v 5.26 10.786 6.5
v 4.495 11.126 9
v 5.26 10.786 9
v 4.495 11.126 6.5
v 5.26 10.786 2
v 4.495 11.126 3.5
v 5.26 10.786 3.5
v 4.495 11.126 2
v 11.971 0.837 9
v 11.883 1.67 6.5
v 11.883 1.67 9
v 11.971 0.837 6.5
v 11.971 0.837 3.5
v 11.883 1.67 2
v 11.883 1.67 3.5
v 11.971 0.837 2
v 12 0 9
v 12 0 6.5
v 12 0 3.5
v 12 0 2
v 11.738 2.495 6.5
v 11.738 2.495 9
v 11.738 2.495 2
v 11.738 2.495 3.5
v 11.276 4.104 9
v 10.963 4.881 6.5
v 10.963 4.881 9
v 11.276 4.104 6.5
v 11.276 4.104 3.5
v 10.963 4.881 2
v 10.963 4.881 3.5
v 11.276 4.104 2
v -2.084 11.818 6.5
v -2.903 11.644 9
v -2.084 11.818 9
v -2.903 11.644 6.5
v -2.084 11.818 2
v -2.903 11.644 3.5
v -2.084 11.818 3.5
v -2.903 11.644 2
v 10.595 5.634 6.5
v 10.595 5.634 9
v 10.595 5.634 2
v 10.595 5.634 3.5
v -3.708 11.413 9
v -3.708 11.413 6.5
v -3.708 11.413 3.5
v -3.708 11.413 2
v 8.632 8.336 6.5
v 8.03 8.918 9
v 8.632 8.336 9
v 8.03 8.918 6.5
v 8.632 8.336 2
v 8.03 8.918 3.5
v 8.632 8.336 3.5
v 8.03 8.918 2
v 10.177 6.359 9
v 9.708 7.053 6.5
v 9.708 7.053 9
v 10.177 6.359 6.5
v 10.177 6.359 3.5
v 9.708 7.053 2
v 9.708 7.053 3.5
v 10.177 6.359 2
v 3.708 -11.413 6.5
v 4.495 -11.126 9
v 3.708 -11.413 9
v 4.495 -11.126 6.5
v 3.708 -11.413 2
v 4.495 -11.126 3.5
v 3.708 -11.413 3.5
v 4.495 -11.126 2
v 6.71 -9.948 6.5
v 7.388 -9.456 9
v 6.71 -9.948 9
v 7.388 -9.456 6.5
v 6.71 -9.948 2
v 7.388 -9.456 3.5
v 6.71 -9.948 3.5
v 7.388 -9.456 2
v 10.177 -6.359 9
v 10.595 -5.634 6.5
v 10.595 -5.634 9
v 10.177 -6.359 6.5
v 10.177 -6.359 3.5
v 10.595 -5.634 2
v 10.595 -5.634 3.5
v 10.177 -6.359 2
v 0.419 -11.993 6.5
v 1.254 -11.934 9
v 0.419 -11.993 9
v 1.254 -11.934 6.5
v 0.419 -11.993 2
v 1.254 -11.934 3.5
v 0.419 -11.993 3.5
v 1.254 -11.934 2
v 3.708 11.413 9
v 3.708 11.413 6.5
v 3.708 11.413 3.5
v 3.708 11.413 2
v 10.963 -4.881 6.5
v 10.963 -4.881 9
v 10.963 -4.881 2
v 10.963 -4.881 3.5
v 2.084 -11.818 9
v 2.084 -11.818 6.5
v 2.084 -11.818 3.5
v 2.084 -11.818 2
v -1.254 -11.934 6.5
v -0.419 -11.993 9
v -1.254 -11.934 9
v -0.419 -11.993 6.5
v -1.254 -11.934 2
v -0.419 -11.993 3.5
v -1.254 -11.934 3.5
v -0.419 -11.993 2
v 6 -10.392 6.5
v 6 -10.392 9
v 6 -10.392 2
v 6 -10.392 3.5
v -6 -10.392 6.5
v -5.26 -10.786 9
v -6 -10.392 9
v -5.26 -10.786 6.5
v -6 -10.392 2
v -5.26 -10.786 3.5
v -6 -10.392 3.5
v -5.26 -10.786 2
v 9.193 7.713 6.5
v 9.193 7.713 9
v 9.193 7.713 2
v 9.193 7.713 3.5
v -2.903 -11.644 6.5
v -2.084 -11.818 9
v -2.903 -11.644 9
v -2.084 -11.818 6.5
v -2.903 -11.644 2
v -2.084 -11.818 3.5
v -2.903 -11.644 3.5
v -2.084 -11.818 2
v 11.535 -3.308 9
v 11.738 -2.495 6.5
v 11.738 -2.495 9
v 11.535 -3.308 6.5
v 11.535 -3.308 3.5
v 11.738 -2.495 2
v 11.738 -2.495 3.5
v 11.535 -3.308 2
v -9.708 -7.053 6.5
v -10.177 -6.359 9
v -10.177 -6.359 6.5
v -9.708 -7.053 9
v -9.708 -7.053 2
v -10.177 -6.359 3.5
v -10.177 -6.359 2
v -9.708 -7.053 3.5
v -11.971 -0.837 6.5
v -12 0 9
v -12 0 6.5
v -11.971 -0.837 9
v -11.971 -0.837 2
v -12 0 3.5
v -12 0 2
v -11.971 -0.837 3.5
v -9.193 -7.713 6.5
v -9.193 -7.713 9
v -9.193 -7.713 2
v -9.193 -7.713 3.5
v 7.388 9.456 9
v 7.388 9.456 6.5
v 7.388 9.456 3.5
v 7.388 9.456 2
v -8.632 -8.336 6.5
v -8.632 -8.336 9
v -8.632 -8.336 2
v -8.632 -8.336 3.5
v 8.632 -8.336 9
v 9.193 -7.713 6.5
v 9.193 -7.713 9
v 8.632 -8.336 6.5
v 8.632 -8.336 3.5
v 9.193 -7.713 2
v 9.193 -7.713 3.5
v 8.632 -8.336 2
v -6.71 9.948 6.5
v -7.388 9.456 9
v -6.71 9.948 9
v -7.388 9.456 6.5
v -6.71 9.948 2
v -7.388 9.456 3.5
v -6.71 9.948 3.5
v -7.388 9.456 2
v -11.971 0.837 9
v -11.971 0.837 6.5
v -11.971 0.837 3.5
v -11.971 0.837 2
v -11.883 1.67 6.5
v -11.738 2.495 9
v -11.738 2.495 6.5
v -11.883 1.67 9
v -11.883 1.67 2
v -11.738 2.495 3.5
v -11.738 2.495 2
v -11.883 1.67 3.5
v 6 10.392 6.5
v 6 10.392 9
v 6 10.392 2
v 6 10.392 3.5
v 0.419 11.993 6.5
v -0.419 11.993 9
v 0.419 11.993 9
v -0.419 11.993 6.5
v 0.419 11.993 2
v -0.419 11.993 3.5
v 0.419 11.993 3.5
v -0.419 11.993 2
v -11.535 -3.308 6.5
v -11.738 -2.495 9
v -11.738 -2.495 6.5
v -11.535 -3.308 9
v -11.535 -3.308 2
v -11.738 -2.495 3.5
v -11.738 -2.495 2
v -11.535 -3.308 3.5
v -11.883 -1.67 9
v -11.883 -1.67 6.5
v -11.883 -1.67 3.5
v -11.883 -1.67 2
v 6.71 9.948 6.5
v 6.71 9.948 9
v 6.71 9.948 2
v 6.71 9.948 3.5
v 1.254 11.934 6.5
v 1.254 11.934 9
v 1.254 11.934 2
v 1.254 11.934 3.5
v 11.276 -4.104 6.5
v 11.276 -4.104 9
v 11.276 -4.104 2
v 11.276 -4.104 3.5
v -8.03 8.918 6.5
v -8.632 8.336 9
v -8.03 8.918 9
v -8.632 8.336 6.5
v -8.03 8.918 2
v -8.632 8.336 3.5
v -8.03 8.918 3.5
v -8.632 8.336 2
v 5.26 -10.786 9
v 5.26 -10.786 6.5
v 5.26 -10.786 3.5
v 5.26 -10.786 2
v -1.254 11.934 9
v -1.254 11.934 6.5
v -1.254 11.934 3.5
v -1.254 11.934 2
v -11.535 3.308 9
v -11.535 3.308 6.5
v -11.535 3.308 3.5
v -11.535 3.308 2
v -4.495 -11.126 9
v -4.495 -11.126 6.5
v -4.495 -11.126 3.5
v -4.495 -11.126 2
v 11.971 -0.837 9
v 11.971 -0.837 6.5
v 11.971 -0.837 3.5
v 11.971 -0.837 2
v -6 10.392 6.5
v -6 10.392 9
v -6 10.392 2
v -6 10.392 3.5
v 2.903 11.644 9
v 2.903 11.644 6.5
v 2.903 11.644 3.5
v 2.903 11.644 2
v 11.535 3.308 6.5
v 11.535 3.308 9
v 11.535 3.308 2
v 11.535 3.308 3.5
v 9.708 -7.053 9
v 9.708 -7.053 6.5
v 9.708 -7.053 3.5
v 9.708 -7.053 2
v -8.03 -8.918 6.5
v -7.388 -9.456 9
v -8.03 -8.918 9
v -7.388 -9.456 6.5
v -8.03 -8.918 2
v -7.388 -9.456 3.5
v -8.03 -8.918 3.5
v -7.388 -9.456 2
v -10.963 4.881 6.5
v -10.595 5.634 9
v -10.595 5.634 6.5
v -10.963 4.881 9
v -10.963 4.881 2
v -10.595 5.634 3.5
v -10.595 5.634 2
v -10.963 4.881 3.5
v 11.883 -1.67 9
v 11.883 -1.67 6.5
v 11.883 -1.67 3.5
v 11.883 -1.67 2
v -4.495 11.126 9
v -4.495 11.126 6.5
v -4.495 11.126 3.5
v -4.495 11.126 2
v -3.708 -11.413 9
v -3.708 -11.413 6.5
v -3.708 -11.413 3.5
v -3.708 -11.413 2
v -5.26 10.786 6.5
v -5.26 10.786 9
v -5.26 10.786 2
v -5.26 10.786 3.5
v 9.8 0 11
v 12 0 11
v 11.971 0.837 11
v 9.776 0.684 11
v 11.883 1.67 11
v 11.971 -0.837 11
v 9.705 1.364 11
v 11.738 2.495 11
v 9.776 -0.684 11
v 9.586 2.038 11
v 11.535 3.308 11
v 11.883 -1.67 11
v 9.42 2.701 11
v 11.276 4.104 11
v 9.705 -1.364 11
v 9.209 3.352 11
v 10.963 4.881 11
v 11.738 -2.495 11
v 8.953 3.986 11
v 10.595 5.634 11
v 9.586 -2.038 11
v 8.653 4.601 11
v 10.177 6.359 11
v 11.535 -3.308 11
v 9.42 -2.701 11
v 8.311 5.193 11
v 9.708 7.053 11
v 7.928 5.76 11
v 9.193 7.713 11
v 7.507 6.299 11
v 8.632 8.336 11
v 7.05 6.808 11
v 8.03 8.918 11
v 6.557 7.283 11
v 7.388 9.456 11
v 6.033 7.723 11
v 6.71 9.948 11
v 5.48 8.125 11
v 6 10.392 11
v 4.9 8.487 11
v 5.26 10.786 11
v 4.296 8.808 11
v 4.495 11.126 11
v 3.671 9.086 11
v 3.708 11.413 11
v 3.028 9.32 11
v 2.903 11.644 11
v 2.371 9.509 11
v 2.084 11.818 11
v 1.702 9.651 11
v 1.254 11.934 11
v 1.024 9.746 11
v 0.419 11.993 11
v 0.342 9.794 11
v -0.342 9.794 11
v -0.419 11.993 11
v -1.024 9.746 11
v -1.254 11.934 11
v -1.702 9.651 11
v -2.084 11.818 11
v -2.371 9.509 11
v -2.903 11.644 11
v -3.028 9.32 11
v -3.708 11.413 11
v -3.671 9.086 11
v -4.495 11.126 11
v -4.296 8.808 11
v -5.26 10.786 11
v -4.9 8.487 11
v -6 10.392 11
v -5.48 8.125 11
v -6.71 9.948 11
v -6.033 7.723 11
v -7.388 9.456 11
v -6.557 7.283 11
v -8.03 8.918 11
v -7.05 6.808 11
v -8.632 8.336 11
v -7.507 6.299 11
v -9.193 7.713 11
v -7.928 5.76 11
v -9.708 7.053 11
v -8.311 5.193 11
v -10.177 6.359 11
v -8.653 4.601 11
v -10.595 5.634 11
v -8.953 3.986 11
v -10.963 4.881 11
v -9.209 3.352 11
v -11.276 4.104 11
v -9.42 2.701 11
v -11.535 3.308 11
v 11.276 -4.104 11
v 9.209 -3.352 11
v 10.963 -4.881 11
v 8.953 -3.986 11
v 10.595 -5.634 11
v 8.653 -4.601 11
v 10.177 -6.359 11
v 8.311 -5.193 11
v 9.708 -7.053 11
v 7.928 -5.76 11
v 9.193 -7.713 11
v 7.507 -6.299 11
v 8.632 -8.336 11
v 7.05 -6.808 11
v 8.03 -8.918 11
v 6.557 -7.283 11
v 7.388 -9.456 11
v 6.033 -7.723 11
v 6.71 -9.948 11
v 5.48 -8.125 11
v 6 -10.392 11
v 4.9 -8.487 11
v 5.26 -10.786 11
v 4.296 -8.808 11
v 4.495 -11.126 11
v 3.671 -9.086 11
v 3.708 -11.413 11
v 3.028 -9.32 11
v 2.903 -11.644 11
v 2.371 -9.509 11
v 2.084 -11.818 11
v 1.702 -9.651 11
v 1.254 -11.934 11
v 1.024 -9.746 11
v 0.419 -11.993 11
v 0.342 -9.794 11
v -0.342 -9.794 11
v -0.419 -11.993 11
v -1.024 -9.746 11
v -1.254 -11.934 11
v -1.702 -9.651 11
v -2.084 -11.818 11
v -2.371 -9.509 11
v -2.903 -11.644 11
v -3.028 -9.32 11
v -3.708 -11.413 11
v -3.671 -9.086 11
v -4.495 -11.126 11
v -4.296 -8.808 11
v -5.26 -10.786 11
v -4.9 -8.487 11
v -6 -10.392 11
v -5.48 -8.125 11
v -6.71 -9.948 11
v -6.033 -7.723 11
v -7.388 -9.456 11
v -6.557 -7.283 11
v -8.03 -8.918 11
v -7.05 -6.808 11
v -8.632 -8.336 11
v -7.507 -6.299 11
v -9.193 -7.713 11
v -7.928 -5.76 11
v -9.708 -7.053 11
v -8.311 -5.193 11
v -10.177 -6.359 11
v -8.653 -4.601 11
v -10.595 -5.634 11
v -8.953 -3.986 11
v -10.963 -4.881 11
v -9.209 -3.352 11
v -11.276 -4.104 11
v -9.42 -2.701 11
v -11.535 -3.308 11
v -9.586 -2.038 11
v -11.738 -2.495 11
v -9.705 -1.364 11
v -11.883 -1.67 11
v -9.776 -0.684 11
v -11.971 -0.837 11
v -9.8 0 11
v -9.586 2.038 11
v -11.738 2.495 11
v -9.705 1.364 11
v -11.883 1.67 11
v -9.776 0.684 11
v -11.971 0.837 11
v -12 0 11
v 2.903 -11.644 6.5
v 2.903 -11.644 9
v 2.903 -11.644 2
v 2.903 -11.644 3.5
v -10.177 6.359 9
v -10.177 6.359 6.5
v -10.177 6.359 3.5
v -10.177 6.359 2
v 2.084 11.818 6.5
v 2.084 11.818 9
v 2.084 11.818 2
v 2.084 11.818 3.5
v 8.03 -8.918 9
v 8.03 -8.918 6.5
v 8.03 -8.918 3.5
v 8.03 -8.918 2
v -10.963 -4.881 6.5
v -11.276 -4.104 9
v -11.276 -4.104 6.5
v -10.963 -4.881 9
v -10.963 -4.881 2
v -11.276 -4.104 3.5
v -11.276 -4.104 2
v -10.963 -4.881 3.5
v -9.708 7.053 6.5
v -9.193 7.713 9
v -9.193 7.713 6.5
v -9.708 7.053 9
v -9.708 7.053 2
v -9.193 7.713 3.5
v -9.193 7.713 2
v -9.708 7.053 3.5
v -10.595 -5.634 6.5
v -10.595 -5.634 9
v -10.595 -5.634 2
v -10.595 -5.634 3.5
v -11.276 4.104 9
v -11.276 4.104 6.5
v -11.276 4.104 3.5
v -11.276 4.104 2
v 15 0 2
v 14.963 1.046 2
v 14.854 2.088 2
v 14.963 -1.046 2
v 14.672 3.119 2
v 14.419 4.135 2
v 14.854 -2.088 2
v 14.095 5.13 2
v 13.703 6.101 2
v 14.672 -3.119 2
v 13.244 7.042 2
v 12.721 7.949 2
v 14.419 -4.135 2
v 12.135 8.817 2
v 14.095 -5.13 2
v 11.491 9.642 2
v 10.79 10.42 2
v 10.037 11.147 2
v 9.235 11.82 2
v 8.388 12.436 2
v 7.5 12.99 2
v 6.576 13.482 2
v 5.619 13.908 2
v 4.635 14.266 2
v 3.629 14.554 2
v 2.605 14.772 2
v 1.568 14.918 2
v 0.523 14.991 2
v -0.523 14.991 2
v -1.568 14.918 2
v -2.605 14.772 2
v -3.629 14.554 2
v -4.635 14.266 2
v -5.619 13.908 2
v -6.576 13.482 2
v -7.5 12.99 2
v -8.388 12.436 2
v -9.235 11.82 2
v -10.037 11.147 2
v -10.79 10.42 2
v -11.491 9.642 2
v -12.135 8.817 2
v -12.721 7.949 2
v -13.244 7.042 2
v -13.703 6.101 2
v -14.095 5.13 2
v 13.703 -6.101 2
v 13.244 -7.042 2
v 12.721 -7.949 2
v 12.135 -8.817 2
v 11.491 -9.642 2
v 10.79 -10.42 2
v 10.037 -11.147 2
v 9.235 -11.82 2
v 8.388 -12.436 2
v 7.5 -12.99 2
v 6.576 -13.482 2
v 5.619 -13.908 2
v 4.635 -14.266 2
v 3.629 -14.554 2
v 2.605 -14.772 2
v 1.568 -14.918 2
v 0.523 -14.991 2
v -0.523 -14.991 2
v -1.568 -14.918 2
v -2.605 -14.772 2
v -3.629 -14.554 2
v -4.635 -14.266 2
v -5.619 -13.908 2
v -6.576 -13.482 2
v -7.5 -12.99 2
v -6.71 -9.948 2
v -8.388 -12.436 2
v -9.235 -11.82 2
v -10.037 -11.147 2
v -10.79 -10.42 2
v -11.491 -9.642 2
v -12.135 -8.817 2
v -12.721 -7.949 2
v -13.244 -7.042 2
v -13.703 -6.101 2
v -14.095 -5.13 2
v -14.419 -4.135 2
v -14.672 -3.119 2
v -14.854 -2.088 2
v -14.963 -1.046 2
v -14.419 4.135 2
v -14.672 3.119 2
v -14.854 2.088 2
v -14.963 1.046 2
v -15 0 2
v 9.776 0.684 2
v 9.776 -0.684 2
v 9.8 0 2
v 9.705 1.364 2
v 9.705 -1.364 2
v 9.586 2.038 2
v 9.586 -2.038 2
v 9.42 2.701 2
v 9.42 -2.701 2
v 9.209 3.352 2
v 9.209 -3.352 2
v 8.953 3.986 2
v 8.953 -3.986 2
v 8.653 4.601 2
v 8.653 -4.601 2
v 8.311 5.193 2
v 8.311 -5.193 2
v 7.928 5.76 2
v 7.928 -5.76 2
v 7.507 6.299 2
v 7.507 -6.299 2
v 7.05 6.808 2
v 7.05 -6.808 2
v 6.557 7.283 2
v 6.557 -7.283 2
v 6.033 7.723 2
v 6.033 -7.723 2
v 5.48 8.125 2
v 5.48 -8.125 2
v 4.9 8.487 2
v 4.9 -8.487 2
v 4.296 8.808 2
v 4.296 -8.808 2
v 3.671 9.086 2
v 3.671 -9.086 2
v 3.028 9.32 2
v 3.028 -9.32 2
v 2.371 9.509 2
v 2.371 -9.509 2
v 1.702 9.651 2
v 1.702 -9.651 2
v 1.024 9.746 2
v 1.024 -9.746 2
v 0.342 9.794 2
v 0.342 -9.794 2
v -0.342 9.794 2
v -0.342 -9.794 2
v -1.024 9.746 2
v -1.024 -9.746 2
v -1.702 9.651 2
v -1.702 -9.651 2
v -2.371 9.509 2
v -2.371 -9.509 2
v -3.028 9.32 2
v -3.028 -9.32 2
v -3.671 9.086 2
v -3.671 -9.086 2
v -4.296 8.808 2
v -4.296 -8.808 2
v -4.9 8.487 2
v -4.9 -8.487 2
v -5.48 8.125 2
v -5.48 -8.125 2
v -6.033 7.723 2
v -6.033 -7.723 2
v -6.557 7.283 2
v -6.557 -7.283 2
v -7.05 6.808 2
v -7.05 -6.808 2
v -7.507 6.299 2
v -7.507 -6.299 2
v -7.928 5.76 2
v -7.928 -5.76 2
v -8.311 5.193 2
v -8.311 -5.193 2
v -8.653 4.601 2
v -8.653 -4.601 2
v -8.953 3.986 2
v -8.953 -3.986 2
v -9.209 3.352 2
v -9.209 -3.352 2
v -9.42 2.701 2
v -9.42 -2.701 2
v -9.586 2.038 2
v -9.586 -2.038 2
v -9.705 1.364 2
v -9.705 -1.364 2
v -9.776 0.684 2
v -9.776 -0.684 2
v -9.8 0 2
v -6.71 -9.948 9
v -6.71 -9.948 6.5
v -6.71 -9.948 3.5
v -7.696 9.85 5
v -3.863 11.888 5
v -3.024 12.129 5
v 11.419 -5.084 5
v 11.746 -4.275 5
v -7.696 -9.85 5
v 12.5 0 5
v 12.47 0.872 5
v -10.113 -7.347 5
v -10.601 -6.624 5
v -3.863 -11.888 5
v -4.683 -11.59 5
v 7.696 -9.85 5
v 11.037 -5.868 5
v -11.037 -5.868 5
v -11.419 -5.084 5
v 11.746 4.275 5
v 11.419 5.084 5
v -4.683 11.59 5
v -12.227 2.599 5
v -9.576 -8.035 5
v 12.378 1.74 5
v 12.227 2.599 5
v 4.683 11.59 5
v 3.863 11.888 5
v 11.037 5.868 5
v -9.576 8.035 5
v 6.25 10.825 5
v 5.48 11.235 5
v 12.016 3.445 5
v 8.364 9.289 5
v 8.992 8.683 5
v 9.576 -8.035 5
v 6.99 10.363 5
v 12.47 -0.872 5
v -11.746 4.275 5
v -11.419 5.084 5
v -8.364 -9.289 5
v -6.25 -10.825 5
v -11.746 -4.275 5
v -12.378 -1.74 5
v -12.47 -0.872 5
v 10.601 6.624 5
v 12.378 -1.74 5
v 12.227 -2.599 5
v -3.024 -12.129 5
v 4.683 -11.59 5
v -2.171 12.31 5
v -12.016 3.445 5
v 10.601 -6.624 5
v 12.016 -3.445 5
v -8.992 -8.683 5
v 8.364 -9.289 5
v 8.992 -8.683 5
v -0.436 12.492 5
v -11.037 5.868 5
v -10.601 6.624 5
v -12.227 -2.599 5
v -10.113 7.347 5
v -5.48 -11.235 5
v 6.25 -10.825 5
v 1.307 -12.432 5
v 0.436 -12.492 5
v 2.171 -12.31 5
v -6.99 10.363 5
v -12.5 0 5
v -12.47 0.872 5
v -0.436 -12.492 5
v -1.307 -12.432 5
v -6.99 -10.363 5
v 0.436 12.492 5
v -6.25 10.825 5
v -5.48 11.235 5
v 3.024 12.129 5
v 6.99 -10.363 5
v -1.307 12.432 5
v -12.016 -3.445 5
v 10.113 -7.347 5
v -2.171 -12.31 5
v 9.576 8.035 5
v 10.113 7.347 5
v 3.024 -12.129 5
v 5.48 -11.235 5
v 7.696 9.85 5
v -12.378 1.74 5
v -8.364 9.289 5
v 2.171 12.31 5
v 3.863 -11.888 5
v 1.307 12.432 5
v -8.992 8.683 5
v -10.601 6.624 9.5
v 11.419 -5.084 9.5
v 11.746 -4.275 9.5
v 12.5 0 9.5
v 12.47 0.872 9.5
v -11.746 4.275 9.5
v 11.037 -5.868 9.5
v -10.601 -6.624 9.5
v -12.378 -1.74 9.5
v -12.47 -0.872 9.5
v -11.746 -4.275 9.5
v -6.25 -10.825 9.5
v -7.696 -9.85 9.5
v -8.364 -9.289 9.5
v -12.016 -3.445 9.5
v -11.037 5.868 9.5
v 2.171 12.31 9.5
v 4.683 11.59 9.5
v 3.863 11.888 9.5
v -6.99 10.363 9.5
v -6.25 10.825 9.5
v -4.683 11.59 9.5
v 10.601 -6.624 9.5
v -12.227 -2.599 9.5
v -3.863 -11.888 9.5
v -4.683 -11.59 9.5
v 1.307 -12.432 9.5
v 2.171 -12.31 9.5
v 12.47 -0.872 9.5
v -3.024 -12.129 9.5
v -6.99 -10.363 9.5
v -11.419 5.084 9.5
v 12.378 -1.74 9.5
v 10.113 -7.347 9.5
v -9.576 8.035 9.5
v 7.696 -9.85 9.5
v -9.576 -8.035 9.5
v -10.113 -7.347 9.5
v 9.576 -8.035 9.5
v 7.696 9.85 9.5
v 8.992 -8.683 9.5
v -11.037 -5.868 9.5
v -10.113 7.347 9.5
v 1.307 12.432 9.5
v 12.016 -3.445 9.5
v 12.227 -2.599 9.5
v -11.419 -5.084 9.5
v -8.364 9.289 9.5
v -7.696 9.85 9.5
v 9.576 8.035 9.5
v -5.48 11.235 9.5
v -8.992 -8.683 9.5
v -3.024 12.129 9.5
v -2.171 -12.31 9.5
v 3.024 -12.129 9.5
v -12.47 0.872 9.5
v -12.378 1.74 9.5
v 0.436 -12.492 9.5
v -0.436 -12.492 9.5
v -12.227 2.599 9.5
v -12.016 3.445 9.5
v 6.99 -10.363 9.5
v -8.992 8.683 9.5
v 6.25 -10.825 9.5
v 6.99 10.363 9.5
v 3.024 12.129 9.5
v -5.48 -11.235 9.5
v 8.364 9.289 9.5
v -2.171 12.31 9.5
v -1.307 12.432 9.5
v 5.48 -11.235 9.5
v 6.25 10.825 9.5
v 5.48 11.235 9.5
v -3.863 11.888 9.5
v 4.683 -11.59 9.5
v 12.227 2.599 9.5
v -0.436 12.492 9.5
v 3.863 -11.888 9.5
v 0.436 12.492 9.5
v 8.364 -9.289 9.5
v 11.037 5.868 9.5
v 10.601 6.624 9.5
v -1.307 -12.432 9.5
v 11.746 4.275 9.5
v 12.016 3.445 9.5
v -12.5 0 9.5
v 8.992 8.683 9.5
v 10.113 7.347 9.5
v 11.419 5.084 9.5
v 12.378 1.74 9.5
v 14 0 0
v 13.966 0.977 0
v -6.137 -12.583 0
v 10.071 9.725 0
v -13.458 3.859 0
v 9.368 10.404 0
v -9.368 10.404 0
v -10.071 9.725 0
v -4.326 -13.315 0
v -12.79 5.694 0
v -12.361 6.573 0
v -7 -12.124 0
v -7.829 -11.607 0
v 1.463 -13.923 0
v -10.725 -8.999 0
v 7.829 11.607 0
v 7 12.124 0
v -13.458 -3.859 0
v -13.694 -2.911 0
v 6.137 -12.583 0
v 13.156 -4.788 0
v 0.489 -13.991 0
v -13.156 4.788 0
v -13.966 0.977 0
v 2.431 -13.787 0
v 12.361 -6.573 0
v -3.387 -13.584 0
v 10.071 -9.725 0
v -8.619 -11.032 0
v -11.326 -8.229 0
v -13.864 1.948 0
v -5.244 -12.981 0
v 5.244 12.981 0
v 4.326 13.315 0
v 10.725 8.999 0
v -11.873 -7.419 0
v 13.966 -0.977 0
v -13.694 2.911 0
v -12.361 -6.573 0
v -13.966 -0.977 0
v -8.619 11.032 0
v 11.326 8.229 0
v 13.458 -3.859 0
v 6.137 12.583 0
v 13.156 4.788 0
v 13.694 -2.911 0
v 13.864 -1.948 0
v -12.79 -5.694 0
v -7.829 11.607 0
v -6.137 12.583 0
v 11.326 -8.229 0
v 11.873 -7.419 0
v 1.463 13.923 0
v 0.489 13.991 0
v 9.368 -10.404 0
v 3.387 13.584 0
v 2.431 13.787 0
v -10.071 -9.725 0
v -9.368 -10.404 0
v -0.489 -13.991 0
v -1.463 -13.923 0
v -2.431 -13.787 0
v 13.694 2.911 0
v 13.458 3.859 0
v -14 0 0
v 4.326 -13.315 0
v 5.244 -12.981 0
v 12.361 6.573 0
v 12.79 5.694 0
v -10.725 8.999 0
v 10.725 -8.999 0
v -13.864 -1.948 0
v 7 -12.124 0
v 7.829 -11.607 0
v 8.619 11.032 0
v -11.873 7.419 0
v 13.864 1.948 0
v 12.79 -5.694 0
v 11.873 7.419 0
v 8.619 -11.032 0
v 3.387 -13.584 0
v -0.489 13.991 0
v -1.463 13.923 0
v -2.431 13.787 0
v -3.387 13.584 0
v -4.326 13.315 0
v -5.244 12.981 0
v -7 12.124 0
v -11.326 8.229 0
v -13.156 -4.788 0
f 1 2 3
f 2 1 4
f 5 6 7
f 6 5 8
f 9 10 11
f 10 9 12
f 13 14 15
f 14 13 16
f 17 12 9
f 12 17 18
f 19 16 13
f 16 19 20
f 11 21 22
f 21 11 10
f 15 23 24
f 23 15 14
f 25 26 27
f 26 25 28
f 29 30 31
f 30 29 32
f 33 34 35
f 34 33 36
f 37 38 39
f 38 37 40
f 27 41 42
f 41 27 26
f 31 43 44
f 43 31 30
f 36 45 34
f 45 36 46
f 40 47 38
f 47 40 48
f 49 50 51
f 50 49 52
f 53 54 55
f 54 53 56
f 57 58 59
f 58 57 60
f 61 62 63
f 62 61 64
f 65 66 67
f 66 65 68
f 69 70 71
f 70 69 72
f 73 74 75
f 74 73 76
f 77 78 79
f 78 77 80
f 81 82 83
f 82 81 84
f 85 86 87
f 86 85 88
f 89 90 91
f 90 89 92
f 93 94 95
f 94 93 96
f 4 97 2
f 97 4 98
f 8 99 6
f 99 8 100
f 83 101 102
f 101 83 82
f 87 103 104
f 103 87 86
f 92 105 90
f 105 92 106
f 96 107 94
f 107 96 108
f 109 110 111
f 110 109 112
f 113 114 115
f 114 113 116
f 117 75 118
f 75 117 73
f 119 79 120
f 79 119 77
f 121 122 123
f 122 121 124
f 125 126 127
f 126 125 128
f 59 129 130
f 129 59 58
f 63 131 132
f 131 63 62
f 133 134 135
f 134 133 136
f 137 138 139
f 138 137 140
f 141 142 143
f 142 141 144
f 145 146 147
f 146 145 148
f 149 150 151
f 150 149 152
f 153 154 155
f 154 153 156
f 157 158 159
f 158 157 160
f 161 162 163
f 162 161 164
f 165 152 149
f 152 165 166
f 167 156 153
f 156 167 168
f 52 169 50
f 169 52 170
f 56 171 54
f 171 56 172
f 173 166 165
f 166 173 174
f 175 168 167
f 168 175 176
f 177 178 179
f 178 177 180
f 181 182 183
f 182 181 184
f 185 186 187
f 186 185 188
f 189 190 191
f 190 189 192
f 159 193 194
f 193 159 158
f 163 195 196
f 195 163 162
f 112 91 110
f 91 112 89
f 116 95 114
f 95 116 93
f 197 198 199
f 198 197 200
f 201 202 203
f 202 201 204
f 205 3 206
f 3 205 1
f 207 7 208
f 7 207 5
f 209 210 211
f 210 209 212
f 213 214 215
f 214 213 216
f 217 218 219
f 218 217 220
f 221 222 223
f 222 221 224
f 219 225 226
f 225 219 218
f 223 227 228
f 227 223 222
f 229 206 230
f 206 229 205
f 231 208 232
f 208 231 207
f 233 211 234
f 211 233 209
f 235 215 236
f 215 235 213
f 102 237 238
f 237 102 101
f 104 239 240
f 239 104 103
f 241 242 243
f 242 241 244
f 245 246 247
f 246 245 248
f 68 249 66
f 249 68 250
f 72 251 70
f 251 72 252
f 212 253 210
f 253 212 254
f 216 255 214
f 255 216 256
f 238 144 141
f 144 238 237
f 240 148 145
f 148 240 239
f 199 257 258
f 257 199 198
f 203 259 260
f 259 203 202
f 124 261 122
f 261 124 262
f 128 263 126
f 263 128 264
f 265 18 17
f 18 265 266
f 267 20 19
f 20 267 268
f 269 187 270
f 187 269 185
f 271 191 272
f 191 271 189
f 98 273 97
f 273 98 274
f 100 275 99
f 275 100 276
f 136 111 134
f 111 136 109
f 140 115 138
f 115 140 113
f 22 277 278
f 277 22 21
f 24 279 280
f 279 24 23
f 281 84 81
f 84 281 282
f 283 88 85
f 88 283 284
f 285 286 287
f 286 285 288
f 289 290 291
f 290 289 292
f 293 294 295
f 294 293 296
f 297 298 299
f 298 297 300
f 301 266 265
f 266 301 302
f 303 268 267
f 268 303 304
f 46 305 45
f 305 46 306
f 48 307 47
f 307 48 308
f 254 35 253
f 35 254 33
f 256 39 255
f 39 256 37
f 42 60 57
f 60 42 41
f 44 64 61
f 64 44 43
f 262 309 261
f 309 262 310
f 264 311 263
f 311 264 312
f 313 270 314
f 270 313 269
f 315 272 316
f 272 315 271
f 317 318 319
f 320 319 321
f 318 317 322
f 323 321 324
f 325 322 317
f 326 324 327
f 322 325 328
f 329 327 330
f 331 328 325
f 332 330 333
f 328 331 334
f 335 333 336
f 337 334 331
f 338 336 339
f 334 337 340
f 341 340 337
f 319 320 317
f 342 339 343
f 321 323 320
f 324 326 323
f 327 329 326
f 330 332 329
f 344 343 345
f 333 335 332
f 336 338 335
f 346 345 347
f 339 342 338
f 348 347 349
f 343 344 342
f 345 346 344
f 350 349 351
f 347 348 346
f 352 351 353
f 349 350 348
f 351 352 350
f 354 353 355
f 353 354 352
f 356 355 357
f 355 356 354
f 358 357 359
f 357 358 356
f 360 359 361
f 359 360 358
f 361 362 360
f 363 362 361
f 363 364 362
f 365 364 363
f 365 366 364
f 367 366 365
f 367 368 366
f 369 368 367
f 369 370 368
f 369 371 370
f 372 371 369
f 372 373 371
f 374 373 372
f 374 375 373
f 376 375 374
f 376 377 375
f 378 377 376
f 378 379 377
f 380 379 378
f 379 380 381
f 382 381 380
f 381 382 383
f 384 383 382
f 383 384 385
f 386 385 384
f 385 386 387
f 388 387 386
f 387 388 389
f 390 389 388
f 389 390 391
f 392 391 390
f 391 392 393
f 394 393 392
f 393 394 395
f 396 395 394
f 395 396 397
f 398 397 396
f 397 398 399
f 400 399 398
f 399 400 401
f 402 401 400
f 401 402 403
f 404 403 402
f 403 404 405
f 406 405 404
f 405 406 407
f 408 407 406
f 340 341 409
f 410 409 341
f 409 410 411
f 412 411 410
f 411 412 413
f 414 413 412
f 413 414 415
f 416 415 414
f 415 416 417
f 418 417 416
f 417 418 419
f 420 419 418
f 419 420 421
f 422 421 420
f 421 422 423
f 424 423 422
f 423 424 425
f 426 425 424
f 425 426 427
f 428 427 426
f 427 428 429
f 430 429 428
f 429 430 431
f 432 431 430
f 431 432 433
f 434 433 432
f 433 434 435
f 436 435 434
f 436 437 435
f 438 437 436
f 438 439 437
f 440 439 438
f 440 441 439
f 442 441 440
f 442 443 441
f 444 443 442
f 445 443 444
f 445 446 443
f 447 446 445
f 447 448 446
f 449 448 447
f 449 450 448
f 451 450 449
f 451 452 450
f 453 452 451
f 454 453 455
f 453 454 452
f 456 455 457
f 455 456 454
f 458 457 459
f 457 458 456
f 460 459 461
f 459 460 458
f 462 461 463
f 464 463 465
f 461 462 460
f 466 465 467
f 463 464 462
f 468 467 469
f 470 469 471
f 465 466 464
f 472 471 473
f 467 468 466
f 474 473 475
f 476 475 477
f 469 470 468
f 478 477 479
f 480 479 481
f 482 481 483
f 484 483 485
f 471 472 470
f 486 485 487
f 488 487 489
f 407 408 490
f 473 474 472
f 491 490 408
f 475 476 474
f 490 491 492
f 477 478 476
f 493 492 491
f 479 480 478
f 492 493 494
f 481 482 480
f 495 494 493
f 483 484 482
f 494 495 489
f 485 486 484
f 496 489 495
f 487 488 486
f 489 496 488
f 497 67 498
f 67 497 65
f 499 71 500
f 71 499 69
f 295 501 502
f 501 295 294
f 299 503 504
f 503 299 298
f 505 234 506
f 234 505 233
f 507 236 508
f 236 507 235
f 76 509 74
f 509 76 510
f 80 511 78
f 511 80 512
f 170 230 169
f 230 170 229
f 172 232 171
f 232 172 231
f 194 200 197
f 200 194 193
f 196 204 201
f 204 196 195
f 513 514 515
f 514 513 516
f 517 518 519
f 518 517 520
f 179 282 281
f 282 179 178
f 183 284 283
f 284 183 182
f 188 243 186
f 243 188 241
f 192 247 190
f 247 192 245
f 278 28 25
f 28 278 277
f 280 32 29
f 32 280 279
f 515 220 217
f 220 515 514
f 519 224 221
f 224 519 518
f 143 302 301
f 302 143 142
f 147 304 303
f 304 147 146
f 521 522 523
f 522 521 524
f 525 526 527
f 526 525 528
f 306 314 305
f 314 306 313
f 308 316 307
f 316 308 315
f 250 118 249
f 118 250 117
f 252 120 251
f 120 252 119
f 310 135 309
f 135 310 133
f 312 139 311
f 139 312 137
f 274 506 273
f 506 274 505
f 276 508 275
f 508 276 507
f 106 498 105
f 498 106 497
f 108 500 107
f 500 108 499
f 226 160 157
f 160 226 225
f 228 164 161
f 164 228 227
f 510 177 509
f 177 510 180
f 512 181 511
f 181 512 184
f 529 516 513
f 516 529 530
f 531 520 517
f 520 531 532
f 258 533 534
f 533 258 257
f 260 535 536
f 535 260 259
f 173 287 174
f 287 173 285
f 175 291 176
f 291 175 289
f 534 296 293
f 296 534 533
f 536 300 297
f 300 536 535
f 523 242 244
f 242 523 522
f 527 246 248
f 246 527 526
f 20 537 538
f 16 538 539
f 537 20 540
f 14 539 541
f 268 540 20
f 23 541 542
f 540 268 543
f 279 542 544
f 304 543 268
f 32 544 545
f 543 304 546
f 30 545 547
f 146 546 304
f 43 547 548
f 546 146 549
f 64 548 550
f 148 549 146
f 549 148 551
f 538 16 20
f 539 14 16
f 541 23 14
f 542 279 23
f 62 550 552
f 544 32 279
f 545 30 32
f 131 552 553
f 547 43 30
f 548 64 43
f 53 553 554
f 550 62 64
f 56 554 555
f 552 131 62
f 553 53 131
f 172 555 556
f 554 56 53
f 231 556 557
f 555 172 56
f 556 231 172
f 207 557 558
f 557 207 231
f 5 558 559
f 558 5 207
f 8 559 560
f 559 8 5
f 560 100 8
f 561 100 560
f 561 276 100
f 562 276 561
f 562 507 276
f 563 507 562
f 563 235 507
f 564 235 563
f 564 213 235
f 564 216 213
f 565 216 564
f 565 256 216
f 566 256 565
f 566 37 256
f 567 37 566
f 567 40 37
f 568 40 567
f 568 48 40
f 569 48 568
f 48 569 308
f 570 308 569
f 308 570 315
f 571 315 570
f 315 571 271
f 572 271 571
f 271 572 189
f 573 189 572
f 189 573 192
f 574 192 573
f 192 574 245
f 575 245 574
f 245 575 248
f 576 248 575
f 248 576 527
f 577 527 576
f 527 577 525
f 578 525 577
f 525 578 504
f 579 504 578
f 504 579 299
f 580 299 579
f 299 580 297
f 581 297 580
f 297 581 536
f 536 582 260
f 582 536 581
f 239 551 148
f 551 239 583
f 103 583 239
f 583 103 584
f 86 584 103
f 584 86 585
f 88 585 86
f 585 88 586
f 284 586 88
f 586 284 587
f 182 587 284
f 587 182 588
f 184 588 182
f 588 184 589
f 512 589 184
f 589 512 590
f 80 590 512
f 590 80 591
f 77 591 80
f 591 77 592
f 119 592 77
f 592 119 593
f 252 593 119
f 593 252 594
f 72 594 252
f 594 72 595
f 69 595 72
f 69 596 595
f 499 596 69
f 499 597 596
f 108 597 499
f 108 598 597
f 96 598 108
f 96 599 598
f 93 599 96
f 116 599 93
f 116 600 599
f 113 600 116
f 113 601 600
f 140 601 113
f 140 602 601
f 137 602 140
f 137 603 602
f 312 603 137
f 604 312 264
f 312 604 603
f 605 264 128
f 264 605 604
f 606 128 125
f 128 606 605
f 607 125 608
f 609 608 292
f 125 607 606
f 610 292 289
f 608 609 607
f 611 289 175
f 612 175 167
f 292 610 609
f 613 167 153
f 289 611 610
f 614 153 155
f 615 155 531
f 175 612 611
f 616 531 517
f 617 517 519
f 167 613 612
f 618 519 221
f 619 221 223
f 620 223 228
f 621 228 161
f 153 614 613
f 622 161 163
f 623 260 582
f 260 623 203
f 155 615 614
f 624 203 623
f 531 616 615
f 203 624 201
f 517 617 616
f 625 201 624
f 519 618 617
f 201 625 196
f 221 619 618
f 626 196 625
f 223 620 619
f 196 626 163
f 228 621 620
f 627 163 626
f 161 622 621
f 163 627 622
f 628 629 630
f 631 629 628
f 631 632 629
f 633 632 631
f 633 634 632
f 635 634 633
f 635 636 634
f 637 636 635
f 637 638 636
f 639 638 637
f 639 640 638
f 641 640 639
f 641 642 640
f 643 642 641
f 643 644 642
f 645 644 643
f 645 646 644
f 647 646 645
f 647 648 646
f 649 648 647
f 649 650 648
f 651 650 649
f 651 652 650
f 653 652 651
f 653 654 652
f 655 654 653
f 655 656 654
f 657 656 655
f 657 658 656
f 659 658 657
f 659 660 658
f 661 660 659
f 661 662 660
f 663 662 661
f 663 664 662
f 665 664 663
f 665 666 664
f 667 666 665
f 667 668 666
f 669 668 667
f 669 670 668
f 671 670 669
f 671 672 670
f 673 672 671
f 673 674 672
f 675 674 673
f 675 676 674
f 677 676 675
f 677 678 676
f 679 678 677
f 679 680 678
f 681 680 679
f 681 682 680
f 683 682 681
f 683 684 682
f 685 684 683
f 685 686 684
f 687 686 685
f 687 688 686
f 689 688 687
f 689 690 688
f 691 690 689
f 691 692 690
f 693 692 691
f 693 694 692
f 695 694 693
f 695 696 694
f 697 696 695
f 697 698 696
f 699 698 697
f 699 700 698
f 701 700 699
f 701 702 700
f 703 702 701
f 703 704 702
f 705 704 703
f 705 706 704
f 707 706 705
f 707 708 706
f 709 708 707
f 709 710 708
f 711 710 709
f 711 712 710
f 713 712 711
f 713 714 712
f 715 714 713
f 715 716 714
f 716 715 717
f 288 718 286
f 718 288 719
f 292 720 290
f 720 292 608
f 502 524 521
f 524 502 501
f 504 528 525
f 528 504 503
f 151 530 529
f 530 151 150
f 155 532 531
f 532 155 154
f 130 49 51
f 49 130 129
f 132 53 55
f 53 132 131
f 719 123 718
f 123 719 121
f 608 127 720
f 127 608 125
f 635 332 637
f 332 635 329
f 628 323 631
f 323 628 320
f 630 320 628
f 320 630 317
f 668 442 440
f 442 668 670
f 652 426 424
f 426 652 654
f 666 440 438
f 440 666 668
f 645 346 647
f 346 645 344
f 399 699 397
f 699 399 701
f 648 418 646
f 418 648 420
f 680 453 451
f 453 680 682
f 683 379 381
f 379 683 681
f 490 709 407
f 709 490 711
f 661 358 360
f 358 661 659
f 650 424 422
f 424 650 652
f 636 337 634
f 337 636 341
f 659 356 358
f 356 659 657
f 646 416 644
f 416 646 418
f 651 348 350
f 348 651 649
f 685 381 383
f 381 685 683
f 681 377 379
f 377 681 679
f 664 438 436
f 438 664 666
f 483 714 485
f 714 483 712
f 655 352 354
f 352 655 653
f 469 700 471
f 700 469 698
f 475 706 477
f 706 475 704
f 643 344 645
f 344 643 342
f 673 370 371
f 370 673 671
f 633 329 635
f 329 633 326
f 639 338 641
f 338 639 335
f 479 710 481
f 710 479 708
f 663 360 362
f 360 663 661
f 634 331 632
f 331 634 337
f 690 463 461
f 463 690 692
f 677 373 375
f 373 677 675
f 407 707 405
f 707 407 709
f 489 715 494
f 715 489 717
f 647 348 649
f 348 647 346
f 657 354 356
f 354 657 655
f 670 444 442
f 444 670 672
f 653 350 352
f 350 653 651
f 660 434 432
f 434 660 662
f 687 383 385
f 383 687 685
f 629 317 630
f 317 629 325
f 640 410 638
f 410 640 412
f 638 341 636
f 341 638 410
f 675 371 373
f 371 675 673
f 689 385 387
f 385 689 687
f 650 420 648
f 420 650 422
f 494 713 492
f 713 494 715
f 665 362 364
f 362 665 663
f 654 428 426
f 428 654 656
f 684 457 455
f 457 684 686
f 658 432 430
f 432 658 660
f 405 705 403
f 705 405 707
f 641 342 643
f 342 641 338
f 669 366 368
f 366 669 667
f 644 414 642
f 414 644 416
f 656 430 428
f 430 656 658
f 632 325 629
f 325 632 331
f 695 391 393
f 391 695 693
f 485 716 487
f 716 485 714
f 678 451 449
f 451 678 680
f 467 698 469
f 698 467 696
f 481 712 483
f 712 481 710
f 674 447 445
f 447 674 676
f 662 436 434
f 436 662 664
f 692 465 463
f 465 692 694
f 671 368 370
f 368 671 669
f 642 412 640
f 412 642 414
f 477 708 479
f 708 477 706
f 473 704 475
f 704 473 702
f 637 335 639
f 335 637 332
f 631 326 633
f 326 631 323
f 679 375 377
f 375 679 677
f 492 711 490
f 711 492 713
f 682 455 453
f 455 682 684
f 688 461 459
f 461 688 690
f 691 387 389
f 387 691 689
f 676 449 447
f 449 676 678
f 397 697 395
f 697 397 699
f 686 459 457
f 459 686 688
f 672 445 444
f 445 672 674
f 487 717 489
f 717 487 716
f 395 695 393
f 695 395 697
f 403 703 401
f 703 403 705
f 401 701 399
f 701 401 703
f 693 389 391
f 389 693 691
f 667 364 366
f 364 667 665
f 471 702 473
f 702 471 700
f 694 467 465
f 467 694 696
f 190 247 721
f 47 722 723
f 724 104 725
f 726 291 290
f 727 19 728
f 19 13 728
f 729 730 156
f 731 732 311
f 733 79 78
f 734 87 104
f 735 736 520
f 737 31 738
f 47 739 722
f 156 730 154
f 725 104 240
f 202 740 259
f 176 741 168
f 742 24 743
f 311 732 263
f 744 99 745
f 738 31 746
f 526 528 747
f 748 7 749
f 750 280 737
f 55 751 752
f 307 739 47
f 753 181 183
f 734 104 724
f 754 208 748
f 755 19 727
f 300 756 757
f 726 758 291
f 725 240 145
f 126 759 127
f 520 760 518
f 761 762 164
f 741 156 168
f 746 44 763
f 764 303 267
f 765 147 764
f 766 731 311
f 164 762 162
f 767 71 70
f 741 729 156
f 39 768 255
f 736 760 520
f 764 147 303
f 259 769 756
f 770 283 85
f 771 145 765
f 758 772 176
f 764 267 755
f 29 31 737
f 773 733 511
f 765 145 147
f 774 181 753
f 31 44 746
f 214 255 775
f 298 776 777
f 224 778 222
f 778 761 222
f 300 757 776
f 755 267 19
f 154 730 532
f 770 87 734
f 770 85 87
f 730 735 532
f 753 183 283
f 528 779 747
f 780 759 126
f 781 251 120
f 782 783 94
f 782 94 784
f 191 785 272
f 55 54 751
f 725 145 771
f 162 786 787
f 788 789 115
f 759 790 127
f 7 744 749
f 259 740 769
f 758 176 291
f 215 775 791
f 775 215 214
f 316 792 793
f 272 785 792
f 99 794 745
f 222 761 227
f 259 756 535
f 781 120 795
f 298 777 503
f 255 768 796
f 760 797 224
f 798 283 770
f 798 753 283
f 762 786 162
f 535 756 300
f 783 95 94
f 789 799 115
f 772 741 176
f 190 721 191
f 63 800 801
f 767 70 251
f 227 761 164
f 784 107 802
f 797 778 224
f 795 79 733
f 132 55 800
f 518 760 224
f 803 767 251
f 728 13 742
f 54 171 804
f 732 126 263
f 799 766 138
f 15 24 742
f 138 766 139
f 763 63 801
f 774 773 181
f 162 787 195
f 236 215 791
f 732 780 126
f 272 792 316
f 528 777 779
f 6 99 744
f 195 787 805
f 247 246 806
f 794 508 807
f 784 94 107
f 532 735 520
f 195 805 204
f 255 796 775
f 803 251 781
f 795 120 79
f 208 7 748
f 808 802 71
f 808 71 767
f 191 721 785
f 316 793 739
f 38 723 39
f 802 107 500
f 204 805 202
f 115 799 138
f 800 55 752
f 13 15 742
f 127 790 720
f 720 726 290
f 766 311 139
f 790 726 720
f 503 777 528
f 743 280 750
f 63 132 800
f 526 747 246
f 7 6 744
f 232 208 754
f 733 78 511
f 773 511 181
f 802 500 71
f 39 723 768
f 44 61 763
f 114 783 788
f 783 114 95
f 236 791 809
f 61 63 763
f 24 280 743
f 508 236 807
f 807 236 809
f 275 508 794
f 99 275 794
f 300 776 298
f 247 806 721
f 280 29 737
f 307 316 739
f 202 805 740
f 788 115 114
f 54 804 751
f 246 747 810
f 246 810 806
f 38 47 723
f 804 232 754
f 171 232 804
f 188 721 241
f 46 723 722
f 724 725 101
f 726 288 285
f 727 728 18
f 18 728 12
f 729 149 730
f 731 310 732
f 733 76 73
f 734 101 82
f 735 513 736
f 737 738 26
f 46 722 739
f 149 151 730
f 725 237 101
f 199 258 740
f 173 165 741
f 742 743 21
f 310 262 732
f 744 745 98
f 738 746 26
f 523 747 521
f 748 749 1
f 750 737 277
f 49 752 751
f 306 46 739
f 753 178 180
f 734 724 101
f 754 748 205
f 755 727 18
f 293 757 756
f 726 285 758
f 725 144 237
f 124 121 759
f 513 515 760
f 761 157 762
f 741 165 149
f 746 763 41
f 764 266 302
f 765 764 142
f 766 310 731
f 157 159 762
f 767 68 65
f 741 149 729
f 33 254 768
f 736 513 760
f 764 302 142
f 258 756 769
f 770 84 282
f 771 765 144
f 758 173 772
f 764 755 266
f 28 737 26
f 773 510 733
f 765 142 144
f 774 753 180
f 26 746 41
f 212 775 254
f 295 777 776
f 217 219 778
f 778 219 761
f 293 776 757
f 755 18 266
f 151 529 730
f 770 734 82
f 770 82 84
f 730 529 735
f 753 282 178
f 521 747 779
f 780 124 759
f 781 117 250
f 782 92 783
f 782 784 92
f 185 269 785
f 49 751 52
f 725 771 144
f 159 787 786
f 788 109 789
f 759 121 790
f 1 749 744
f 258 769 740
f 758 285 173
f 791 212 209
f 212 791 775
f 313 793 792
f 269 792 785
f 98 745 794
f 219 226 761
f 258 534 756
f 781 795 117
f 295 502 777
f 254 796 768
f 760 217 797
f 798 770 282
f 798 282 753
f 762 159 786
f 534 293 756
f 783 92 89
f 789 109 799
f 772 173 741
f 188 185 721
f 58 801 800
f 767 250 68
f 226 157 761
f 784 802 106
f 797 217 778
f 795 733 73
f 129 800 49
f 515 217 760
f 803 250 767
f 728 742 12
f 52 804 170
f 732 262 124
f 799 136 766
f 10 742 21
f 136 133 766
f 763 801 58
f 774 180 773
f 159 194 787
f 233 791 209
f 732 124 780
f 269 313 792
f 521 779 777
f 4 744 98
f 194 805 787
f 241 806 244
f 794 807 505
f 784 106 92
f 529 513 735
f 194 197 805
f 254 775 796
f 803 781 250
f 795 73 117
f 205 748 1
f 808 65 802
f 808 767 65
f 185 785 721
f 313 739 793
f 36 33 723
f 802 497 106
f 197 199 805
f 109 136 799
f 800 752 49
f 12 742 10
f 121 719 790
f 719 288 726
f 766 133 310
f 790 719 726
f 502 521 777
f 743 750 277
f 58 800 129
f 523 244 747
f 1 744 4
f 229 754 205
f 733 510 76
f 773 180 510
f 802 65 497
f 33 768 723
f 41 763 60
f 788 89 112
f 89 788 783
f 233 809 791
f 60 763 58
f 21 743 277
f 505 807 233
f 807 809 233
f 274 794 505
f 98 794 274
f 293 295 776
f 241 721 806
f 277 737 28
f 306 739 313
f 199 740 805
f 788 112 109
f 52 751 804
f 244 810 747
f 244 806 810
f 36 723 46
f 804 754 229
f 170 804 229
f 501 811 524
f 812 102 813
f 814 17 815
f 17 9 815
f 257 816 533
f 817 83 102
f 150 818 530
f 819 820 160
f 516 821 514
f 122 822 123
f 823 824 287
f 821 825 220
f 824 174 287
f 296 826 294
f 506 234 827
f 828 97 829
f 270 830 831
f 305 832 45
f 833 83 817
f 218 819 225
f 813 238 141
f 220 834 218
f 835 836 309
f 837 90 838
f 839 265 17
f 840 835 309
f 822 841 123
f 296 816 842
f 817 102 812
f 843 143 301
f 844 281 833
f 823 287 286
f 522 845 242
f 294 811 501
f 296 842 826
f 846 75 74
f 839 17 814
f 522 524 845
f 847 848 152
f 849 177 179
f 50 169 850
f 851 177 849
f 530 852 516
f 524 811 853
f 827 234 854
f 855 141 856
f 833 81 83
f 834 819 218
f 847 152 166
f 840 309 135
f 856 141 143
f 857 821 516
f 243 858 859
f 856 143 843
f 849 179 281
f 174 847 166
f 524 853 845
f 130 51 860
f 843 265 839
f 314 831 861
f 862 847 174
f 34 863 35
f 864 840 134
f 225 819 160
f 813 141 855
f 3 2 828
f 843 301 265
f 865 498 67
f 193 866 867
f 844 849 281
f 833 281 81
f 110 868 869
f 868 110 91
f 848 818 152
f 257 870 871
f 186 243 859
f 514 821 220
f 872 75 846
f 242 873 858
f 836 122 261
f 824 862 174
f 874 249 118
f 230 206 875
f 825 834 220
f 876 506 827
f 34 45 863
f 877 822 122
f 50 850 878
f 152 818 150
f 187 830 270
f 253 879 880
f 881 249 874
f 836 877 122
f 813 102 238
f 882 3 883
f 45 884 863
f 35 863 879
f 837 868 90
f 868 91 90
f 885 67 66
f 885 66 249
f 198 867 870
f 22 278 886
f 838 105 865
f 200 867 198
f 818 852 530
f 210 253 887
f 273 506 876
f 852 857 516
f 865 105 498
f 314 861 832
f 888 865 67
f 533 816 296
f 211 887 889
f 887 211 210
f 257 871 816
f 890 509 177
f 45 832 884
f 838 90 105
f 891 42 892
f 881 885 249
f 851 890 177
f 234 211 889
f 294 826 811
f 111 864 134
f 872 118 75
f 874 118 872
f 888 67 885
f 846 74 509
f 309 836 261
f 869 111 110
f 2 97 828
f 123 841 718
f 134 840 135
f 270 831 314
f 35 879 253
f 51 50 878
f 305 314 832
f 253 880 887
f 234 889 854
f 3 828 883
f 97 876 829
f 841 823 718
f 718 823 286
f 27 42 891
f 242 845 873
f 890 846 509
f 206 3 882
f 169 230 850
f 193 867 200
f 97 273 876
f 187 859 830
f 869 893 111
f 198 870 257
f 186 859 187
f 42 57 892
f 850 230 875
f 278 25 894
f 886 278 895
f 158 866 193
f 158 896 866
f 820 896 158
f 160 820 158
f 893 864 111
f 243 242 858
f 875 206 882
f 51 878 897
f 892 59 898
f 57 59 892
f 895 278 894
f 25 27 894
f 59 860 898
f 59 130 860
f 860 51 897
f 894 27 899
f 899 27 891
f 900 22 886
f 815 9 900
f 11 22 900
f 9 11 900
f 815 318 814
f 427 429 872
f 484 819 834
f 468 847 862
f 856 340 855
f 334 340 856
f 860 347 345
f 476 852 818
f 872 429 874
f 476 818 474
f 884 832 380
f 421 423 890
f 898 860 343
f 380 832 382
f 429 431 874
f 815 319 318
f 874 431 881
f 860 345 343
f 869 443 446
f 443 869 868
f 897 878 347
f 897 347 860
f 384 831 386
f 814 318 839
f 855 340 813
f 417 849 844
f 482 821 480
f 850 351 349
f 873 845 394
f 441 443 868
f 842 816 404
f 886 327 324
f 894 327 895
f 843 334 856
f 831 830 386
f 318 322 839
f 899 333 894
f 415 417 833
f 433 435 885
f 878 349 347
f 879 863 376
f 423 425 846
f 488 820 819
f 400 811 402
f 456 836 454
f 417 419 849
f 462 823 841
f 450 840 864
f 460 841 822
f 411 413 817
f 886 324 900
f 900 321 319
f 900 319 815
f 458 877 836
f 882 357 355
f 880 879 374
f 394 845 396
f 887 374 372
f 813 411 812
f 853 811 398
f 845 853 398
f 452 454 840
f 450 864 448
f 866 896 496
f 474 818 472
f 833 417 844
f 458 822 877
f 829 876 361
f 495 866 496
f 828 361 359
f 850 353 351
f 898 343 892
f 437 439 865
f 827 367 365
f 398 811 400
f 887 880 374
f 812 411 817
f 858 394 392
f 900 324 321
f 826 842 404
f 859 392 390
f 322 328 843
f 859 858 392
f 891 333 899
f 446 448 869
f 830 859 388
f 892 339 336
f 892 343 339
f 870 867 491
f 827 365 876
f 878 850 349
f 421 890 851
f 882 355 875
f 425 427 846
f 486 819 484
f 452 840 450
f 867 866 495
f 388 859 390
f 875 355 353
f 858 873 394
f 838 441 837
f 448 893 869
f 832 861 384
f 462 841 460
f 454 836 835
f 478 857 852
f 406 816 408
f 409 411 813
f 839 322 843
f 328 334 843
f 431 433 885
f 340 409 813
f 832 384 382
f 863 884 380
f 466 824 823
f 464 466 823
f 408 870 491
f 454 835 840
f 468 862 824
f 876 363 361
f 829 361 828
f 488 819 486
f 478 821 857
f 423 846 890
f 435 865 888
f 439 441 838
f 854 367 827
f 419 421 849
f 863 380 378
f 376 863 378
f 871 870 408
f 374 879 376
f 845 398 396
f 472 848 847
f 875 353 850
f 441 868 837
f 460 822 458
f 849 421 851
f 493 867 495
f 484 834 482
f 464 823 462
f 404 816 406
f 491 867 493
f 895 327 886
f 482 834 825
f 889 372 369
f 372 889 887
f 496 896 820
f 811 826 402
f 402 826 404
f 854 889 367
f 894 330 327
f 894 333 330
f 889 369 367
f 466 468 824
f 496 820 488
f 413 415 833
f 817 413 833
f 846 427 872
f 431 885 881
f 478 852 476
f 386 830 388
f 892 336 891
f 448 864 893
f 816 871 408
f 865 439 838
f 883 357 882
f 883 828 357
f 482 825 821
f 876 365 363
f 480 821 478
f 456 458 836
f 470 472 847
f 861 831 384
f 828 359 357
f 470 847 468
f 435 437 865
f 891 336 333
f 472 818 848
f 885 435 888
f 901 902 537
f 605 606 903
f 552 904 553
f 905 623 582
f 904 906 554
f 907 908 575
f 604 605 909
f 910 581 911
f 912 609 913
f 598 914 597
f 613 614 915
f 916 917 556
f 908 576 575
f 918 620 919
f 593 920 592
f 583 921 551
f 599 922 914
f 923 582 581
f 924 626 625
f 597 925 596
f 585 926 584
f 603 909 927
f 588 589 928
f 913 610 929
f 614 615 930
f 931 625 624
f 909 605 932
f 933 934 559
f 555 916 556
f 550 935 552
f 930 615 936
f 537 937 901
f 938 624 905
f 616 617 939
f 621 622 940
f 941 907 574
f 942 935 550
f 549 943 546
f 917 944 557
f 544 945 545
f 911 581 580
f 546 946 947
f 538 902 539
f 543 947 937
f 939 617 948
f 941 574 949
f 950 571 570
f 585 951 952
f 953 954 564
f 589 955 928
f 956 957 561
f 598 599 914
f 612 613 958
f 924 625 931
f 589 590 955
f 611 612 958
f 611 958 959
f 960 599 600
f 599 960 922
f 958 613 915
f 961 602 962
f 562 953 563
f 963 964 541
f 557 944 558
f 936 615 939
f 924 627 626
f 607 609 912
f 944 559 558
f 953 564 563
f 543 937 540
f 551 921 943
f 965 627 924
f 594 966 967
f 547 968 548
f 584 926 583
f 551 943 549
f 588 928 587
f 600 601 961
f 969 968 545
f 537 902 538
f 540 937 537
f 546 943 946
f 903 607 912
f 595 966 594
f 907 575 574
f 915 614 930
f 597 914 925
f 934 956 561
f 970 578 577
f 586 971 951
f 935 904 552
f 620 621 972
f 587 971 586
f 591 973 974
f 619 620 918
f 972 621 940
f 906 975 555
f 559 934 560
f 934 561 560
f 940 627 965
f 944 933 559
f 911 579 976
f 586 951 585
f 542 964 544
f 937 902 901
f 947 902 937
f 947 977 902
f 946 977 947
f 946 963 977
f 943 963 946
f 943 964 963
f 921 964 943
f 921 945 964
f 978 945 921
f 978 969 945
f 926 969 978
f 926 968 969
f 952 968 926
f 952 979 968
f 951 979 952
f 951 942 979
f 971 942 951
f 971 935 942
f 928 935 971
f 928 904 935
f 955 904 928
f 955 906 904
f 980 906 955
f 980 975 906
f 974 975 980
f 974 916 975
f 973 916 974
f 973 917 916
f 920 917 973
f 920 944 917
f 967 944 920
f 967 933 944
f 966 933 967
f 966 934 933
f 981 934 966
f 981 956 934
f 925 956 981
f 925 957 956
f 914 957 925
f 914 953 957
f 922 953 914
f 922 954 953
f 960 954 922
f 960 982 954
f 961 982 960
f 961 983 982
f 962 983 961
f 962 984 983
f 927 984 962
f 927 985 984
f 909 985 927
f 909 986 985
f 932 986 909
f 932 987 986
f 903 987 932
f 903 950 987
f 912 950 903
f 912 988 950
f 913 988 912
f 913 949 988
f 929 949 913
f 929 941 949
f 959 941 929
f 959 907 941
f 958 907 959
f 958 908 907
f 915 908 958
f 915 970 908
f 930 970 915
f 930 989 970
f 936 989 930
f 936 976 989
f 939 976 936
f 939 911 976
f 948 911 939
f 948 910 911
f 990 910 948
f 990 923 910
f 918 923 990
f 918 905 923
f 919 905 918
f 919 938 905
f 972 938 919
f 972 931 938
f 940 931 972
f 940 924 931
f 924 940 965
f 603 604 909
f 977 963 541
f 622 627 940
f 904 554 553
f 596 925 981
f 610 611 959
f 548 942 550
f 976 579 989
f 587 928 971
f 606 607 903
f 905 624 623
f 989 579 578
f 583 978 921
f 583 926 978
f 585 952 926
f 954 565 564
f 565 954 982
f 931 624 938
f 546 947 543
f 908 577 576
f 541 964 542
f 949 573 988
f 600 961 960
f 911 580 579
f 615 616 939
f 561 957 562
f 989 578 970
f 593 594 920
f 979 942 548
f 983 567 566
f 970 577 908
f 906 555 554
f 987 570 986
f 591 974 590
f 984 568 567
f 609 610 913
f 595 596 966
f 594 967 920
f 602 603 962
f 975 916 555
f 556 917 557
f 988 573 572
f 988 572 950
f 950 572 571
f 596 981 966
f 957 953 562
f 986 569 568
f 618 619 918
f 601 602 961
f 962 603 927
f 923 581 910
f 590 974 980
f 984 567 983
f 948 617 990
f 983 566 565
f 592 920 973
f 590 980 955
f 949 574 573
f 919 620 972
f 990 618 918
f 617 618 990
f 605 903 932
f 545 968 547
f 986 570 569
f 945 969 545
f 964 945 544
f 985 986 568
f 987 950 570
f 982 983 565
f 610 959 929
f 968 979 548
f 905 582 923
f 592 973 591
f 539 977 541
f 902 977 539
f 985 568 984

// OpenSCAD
// Screw dust/water proof cover for scooter
//
// This work is licensed under a Creative Commons
// Attribution-NonCommercial-ShareAlike 4.0 International (CC BY-NC-SA 4.0)
// Visit: http://creativecommons.org/licenses/by-nc-sa/4.0/
//
// Clarence Lee
// clarence@nehs.tw

// Note: Test on PTE material


$fn = 360/4;

Cap_radius = 12.0;
Cap_radius_lips = 0.5;

Cap_Cover_radius = 15.0;
Cap_height = 11.0;

Cap_radius_wider = Cap_radius + Cap_radius_lips;

module lips(z_off, r_a, r_b, height_l)
{
	difference()
	{		
		translate([0,0,z_off]){
			# cylinder(r1=r_a, r2=r_b,h=height_l);}
		translate([0,0,z_off]) {
			# cylinder(r=min(r_a,r_b) ,h=height_l); }

	}
}

union()
{
	cylinder(r1=Cap_Cover_radius-1,r2=Cap_Cover_radius, h=2);

	difference()
	{
		
		translate([0,0,2])
			cylinder(r=Cap_radius,h=Cap_height-2);
		translate([0,0,2])
			cylinder(r=Cap_radius-2.2,h=Cap_height-2);	
	}


	lips(3.5, Cap_radius, Cap_radius_wider, 1.5);
	translate([0,0,10]) mirror([0,0,1]) lips(3.5, Cap_radius, Cap_radius_wider, 1.5);
	lips(Cap_height-2, Cap_radius, Cap_radius_wider, 0.5);
	lips(Cap_height-1.5, Cap_radius_wider, Cap_radius, 1.5);

}
